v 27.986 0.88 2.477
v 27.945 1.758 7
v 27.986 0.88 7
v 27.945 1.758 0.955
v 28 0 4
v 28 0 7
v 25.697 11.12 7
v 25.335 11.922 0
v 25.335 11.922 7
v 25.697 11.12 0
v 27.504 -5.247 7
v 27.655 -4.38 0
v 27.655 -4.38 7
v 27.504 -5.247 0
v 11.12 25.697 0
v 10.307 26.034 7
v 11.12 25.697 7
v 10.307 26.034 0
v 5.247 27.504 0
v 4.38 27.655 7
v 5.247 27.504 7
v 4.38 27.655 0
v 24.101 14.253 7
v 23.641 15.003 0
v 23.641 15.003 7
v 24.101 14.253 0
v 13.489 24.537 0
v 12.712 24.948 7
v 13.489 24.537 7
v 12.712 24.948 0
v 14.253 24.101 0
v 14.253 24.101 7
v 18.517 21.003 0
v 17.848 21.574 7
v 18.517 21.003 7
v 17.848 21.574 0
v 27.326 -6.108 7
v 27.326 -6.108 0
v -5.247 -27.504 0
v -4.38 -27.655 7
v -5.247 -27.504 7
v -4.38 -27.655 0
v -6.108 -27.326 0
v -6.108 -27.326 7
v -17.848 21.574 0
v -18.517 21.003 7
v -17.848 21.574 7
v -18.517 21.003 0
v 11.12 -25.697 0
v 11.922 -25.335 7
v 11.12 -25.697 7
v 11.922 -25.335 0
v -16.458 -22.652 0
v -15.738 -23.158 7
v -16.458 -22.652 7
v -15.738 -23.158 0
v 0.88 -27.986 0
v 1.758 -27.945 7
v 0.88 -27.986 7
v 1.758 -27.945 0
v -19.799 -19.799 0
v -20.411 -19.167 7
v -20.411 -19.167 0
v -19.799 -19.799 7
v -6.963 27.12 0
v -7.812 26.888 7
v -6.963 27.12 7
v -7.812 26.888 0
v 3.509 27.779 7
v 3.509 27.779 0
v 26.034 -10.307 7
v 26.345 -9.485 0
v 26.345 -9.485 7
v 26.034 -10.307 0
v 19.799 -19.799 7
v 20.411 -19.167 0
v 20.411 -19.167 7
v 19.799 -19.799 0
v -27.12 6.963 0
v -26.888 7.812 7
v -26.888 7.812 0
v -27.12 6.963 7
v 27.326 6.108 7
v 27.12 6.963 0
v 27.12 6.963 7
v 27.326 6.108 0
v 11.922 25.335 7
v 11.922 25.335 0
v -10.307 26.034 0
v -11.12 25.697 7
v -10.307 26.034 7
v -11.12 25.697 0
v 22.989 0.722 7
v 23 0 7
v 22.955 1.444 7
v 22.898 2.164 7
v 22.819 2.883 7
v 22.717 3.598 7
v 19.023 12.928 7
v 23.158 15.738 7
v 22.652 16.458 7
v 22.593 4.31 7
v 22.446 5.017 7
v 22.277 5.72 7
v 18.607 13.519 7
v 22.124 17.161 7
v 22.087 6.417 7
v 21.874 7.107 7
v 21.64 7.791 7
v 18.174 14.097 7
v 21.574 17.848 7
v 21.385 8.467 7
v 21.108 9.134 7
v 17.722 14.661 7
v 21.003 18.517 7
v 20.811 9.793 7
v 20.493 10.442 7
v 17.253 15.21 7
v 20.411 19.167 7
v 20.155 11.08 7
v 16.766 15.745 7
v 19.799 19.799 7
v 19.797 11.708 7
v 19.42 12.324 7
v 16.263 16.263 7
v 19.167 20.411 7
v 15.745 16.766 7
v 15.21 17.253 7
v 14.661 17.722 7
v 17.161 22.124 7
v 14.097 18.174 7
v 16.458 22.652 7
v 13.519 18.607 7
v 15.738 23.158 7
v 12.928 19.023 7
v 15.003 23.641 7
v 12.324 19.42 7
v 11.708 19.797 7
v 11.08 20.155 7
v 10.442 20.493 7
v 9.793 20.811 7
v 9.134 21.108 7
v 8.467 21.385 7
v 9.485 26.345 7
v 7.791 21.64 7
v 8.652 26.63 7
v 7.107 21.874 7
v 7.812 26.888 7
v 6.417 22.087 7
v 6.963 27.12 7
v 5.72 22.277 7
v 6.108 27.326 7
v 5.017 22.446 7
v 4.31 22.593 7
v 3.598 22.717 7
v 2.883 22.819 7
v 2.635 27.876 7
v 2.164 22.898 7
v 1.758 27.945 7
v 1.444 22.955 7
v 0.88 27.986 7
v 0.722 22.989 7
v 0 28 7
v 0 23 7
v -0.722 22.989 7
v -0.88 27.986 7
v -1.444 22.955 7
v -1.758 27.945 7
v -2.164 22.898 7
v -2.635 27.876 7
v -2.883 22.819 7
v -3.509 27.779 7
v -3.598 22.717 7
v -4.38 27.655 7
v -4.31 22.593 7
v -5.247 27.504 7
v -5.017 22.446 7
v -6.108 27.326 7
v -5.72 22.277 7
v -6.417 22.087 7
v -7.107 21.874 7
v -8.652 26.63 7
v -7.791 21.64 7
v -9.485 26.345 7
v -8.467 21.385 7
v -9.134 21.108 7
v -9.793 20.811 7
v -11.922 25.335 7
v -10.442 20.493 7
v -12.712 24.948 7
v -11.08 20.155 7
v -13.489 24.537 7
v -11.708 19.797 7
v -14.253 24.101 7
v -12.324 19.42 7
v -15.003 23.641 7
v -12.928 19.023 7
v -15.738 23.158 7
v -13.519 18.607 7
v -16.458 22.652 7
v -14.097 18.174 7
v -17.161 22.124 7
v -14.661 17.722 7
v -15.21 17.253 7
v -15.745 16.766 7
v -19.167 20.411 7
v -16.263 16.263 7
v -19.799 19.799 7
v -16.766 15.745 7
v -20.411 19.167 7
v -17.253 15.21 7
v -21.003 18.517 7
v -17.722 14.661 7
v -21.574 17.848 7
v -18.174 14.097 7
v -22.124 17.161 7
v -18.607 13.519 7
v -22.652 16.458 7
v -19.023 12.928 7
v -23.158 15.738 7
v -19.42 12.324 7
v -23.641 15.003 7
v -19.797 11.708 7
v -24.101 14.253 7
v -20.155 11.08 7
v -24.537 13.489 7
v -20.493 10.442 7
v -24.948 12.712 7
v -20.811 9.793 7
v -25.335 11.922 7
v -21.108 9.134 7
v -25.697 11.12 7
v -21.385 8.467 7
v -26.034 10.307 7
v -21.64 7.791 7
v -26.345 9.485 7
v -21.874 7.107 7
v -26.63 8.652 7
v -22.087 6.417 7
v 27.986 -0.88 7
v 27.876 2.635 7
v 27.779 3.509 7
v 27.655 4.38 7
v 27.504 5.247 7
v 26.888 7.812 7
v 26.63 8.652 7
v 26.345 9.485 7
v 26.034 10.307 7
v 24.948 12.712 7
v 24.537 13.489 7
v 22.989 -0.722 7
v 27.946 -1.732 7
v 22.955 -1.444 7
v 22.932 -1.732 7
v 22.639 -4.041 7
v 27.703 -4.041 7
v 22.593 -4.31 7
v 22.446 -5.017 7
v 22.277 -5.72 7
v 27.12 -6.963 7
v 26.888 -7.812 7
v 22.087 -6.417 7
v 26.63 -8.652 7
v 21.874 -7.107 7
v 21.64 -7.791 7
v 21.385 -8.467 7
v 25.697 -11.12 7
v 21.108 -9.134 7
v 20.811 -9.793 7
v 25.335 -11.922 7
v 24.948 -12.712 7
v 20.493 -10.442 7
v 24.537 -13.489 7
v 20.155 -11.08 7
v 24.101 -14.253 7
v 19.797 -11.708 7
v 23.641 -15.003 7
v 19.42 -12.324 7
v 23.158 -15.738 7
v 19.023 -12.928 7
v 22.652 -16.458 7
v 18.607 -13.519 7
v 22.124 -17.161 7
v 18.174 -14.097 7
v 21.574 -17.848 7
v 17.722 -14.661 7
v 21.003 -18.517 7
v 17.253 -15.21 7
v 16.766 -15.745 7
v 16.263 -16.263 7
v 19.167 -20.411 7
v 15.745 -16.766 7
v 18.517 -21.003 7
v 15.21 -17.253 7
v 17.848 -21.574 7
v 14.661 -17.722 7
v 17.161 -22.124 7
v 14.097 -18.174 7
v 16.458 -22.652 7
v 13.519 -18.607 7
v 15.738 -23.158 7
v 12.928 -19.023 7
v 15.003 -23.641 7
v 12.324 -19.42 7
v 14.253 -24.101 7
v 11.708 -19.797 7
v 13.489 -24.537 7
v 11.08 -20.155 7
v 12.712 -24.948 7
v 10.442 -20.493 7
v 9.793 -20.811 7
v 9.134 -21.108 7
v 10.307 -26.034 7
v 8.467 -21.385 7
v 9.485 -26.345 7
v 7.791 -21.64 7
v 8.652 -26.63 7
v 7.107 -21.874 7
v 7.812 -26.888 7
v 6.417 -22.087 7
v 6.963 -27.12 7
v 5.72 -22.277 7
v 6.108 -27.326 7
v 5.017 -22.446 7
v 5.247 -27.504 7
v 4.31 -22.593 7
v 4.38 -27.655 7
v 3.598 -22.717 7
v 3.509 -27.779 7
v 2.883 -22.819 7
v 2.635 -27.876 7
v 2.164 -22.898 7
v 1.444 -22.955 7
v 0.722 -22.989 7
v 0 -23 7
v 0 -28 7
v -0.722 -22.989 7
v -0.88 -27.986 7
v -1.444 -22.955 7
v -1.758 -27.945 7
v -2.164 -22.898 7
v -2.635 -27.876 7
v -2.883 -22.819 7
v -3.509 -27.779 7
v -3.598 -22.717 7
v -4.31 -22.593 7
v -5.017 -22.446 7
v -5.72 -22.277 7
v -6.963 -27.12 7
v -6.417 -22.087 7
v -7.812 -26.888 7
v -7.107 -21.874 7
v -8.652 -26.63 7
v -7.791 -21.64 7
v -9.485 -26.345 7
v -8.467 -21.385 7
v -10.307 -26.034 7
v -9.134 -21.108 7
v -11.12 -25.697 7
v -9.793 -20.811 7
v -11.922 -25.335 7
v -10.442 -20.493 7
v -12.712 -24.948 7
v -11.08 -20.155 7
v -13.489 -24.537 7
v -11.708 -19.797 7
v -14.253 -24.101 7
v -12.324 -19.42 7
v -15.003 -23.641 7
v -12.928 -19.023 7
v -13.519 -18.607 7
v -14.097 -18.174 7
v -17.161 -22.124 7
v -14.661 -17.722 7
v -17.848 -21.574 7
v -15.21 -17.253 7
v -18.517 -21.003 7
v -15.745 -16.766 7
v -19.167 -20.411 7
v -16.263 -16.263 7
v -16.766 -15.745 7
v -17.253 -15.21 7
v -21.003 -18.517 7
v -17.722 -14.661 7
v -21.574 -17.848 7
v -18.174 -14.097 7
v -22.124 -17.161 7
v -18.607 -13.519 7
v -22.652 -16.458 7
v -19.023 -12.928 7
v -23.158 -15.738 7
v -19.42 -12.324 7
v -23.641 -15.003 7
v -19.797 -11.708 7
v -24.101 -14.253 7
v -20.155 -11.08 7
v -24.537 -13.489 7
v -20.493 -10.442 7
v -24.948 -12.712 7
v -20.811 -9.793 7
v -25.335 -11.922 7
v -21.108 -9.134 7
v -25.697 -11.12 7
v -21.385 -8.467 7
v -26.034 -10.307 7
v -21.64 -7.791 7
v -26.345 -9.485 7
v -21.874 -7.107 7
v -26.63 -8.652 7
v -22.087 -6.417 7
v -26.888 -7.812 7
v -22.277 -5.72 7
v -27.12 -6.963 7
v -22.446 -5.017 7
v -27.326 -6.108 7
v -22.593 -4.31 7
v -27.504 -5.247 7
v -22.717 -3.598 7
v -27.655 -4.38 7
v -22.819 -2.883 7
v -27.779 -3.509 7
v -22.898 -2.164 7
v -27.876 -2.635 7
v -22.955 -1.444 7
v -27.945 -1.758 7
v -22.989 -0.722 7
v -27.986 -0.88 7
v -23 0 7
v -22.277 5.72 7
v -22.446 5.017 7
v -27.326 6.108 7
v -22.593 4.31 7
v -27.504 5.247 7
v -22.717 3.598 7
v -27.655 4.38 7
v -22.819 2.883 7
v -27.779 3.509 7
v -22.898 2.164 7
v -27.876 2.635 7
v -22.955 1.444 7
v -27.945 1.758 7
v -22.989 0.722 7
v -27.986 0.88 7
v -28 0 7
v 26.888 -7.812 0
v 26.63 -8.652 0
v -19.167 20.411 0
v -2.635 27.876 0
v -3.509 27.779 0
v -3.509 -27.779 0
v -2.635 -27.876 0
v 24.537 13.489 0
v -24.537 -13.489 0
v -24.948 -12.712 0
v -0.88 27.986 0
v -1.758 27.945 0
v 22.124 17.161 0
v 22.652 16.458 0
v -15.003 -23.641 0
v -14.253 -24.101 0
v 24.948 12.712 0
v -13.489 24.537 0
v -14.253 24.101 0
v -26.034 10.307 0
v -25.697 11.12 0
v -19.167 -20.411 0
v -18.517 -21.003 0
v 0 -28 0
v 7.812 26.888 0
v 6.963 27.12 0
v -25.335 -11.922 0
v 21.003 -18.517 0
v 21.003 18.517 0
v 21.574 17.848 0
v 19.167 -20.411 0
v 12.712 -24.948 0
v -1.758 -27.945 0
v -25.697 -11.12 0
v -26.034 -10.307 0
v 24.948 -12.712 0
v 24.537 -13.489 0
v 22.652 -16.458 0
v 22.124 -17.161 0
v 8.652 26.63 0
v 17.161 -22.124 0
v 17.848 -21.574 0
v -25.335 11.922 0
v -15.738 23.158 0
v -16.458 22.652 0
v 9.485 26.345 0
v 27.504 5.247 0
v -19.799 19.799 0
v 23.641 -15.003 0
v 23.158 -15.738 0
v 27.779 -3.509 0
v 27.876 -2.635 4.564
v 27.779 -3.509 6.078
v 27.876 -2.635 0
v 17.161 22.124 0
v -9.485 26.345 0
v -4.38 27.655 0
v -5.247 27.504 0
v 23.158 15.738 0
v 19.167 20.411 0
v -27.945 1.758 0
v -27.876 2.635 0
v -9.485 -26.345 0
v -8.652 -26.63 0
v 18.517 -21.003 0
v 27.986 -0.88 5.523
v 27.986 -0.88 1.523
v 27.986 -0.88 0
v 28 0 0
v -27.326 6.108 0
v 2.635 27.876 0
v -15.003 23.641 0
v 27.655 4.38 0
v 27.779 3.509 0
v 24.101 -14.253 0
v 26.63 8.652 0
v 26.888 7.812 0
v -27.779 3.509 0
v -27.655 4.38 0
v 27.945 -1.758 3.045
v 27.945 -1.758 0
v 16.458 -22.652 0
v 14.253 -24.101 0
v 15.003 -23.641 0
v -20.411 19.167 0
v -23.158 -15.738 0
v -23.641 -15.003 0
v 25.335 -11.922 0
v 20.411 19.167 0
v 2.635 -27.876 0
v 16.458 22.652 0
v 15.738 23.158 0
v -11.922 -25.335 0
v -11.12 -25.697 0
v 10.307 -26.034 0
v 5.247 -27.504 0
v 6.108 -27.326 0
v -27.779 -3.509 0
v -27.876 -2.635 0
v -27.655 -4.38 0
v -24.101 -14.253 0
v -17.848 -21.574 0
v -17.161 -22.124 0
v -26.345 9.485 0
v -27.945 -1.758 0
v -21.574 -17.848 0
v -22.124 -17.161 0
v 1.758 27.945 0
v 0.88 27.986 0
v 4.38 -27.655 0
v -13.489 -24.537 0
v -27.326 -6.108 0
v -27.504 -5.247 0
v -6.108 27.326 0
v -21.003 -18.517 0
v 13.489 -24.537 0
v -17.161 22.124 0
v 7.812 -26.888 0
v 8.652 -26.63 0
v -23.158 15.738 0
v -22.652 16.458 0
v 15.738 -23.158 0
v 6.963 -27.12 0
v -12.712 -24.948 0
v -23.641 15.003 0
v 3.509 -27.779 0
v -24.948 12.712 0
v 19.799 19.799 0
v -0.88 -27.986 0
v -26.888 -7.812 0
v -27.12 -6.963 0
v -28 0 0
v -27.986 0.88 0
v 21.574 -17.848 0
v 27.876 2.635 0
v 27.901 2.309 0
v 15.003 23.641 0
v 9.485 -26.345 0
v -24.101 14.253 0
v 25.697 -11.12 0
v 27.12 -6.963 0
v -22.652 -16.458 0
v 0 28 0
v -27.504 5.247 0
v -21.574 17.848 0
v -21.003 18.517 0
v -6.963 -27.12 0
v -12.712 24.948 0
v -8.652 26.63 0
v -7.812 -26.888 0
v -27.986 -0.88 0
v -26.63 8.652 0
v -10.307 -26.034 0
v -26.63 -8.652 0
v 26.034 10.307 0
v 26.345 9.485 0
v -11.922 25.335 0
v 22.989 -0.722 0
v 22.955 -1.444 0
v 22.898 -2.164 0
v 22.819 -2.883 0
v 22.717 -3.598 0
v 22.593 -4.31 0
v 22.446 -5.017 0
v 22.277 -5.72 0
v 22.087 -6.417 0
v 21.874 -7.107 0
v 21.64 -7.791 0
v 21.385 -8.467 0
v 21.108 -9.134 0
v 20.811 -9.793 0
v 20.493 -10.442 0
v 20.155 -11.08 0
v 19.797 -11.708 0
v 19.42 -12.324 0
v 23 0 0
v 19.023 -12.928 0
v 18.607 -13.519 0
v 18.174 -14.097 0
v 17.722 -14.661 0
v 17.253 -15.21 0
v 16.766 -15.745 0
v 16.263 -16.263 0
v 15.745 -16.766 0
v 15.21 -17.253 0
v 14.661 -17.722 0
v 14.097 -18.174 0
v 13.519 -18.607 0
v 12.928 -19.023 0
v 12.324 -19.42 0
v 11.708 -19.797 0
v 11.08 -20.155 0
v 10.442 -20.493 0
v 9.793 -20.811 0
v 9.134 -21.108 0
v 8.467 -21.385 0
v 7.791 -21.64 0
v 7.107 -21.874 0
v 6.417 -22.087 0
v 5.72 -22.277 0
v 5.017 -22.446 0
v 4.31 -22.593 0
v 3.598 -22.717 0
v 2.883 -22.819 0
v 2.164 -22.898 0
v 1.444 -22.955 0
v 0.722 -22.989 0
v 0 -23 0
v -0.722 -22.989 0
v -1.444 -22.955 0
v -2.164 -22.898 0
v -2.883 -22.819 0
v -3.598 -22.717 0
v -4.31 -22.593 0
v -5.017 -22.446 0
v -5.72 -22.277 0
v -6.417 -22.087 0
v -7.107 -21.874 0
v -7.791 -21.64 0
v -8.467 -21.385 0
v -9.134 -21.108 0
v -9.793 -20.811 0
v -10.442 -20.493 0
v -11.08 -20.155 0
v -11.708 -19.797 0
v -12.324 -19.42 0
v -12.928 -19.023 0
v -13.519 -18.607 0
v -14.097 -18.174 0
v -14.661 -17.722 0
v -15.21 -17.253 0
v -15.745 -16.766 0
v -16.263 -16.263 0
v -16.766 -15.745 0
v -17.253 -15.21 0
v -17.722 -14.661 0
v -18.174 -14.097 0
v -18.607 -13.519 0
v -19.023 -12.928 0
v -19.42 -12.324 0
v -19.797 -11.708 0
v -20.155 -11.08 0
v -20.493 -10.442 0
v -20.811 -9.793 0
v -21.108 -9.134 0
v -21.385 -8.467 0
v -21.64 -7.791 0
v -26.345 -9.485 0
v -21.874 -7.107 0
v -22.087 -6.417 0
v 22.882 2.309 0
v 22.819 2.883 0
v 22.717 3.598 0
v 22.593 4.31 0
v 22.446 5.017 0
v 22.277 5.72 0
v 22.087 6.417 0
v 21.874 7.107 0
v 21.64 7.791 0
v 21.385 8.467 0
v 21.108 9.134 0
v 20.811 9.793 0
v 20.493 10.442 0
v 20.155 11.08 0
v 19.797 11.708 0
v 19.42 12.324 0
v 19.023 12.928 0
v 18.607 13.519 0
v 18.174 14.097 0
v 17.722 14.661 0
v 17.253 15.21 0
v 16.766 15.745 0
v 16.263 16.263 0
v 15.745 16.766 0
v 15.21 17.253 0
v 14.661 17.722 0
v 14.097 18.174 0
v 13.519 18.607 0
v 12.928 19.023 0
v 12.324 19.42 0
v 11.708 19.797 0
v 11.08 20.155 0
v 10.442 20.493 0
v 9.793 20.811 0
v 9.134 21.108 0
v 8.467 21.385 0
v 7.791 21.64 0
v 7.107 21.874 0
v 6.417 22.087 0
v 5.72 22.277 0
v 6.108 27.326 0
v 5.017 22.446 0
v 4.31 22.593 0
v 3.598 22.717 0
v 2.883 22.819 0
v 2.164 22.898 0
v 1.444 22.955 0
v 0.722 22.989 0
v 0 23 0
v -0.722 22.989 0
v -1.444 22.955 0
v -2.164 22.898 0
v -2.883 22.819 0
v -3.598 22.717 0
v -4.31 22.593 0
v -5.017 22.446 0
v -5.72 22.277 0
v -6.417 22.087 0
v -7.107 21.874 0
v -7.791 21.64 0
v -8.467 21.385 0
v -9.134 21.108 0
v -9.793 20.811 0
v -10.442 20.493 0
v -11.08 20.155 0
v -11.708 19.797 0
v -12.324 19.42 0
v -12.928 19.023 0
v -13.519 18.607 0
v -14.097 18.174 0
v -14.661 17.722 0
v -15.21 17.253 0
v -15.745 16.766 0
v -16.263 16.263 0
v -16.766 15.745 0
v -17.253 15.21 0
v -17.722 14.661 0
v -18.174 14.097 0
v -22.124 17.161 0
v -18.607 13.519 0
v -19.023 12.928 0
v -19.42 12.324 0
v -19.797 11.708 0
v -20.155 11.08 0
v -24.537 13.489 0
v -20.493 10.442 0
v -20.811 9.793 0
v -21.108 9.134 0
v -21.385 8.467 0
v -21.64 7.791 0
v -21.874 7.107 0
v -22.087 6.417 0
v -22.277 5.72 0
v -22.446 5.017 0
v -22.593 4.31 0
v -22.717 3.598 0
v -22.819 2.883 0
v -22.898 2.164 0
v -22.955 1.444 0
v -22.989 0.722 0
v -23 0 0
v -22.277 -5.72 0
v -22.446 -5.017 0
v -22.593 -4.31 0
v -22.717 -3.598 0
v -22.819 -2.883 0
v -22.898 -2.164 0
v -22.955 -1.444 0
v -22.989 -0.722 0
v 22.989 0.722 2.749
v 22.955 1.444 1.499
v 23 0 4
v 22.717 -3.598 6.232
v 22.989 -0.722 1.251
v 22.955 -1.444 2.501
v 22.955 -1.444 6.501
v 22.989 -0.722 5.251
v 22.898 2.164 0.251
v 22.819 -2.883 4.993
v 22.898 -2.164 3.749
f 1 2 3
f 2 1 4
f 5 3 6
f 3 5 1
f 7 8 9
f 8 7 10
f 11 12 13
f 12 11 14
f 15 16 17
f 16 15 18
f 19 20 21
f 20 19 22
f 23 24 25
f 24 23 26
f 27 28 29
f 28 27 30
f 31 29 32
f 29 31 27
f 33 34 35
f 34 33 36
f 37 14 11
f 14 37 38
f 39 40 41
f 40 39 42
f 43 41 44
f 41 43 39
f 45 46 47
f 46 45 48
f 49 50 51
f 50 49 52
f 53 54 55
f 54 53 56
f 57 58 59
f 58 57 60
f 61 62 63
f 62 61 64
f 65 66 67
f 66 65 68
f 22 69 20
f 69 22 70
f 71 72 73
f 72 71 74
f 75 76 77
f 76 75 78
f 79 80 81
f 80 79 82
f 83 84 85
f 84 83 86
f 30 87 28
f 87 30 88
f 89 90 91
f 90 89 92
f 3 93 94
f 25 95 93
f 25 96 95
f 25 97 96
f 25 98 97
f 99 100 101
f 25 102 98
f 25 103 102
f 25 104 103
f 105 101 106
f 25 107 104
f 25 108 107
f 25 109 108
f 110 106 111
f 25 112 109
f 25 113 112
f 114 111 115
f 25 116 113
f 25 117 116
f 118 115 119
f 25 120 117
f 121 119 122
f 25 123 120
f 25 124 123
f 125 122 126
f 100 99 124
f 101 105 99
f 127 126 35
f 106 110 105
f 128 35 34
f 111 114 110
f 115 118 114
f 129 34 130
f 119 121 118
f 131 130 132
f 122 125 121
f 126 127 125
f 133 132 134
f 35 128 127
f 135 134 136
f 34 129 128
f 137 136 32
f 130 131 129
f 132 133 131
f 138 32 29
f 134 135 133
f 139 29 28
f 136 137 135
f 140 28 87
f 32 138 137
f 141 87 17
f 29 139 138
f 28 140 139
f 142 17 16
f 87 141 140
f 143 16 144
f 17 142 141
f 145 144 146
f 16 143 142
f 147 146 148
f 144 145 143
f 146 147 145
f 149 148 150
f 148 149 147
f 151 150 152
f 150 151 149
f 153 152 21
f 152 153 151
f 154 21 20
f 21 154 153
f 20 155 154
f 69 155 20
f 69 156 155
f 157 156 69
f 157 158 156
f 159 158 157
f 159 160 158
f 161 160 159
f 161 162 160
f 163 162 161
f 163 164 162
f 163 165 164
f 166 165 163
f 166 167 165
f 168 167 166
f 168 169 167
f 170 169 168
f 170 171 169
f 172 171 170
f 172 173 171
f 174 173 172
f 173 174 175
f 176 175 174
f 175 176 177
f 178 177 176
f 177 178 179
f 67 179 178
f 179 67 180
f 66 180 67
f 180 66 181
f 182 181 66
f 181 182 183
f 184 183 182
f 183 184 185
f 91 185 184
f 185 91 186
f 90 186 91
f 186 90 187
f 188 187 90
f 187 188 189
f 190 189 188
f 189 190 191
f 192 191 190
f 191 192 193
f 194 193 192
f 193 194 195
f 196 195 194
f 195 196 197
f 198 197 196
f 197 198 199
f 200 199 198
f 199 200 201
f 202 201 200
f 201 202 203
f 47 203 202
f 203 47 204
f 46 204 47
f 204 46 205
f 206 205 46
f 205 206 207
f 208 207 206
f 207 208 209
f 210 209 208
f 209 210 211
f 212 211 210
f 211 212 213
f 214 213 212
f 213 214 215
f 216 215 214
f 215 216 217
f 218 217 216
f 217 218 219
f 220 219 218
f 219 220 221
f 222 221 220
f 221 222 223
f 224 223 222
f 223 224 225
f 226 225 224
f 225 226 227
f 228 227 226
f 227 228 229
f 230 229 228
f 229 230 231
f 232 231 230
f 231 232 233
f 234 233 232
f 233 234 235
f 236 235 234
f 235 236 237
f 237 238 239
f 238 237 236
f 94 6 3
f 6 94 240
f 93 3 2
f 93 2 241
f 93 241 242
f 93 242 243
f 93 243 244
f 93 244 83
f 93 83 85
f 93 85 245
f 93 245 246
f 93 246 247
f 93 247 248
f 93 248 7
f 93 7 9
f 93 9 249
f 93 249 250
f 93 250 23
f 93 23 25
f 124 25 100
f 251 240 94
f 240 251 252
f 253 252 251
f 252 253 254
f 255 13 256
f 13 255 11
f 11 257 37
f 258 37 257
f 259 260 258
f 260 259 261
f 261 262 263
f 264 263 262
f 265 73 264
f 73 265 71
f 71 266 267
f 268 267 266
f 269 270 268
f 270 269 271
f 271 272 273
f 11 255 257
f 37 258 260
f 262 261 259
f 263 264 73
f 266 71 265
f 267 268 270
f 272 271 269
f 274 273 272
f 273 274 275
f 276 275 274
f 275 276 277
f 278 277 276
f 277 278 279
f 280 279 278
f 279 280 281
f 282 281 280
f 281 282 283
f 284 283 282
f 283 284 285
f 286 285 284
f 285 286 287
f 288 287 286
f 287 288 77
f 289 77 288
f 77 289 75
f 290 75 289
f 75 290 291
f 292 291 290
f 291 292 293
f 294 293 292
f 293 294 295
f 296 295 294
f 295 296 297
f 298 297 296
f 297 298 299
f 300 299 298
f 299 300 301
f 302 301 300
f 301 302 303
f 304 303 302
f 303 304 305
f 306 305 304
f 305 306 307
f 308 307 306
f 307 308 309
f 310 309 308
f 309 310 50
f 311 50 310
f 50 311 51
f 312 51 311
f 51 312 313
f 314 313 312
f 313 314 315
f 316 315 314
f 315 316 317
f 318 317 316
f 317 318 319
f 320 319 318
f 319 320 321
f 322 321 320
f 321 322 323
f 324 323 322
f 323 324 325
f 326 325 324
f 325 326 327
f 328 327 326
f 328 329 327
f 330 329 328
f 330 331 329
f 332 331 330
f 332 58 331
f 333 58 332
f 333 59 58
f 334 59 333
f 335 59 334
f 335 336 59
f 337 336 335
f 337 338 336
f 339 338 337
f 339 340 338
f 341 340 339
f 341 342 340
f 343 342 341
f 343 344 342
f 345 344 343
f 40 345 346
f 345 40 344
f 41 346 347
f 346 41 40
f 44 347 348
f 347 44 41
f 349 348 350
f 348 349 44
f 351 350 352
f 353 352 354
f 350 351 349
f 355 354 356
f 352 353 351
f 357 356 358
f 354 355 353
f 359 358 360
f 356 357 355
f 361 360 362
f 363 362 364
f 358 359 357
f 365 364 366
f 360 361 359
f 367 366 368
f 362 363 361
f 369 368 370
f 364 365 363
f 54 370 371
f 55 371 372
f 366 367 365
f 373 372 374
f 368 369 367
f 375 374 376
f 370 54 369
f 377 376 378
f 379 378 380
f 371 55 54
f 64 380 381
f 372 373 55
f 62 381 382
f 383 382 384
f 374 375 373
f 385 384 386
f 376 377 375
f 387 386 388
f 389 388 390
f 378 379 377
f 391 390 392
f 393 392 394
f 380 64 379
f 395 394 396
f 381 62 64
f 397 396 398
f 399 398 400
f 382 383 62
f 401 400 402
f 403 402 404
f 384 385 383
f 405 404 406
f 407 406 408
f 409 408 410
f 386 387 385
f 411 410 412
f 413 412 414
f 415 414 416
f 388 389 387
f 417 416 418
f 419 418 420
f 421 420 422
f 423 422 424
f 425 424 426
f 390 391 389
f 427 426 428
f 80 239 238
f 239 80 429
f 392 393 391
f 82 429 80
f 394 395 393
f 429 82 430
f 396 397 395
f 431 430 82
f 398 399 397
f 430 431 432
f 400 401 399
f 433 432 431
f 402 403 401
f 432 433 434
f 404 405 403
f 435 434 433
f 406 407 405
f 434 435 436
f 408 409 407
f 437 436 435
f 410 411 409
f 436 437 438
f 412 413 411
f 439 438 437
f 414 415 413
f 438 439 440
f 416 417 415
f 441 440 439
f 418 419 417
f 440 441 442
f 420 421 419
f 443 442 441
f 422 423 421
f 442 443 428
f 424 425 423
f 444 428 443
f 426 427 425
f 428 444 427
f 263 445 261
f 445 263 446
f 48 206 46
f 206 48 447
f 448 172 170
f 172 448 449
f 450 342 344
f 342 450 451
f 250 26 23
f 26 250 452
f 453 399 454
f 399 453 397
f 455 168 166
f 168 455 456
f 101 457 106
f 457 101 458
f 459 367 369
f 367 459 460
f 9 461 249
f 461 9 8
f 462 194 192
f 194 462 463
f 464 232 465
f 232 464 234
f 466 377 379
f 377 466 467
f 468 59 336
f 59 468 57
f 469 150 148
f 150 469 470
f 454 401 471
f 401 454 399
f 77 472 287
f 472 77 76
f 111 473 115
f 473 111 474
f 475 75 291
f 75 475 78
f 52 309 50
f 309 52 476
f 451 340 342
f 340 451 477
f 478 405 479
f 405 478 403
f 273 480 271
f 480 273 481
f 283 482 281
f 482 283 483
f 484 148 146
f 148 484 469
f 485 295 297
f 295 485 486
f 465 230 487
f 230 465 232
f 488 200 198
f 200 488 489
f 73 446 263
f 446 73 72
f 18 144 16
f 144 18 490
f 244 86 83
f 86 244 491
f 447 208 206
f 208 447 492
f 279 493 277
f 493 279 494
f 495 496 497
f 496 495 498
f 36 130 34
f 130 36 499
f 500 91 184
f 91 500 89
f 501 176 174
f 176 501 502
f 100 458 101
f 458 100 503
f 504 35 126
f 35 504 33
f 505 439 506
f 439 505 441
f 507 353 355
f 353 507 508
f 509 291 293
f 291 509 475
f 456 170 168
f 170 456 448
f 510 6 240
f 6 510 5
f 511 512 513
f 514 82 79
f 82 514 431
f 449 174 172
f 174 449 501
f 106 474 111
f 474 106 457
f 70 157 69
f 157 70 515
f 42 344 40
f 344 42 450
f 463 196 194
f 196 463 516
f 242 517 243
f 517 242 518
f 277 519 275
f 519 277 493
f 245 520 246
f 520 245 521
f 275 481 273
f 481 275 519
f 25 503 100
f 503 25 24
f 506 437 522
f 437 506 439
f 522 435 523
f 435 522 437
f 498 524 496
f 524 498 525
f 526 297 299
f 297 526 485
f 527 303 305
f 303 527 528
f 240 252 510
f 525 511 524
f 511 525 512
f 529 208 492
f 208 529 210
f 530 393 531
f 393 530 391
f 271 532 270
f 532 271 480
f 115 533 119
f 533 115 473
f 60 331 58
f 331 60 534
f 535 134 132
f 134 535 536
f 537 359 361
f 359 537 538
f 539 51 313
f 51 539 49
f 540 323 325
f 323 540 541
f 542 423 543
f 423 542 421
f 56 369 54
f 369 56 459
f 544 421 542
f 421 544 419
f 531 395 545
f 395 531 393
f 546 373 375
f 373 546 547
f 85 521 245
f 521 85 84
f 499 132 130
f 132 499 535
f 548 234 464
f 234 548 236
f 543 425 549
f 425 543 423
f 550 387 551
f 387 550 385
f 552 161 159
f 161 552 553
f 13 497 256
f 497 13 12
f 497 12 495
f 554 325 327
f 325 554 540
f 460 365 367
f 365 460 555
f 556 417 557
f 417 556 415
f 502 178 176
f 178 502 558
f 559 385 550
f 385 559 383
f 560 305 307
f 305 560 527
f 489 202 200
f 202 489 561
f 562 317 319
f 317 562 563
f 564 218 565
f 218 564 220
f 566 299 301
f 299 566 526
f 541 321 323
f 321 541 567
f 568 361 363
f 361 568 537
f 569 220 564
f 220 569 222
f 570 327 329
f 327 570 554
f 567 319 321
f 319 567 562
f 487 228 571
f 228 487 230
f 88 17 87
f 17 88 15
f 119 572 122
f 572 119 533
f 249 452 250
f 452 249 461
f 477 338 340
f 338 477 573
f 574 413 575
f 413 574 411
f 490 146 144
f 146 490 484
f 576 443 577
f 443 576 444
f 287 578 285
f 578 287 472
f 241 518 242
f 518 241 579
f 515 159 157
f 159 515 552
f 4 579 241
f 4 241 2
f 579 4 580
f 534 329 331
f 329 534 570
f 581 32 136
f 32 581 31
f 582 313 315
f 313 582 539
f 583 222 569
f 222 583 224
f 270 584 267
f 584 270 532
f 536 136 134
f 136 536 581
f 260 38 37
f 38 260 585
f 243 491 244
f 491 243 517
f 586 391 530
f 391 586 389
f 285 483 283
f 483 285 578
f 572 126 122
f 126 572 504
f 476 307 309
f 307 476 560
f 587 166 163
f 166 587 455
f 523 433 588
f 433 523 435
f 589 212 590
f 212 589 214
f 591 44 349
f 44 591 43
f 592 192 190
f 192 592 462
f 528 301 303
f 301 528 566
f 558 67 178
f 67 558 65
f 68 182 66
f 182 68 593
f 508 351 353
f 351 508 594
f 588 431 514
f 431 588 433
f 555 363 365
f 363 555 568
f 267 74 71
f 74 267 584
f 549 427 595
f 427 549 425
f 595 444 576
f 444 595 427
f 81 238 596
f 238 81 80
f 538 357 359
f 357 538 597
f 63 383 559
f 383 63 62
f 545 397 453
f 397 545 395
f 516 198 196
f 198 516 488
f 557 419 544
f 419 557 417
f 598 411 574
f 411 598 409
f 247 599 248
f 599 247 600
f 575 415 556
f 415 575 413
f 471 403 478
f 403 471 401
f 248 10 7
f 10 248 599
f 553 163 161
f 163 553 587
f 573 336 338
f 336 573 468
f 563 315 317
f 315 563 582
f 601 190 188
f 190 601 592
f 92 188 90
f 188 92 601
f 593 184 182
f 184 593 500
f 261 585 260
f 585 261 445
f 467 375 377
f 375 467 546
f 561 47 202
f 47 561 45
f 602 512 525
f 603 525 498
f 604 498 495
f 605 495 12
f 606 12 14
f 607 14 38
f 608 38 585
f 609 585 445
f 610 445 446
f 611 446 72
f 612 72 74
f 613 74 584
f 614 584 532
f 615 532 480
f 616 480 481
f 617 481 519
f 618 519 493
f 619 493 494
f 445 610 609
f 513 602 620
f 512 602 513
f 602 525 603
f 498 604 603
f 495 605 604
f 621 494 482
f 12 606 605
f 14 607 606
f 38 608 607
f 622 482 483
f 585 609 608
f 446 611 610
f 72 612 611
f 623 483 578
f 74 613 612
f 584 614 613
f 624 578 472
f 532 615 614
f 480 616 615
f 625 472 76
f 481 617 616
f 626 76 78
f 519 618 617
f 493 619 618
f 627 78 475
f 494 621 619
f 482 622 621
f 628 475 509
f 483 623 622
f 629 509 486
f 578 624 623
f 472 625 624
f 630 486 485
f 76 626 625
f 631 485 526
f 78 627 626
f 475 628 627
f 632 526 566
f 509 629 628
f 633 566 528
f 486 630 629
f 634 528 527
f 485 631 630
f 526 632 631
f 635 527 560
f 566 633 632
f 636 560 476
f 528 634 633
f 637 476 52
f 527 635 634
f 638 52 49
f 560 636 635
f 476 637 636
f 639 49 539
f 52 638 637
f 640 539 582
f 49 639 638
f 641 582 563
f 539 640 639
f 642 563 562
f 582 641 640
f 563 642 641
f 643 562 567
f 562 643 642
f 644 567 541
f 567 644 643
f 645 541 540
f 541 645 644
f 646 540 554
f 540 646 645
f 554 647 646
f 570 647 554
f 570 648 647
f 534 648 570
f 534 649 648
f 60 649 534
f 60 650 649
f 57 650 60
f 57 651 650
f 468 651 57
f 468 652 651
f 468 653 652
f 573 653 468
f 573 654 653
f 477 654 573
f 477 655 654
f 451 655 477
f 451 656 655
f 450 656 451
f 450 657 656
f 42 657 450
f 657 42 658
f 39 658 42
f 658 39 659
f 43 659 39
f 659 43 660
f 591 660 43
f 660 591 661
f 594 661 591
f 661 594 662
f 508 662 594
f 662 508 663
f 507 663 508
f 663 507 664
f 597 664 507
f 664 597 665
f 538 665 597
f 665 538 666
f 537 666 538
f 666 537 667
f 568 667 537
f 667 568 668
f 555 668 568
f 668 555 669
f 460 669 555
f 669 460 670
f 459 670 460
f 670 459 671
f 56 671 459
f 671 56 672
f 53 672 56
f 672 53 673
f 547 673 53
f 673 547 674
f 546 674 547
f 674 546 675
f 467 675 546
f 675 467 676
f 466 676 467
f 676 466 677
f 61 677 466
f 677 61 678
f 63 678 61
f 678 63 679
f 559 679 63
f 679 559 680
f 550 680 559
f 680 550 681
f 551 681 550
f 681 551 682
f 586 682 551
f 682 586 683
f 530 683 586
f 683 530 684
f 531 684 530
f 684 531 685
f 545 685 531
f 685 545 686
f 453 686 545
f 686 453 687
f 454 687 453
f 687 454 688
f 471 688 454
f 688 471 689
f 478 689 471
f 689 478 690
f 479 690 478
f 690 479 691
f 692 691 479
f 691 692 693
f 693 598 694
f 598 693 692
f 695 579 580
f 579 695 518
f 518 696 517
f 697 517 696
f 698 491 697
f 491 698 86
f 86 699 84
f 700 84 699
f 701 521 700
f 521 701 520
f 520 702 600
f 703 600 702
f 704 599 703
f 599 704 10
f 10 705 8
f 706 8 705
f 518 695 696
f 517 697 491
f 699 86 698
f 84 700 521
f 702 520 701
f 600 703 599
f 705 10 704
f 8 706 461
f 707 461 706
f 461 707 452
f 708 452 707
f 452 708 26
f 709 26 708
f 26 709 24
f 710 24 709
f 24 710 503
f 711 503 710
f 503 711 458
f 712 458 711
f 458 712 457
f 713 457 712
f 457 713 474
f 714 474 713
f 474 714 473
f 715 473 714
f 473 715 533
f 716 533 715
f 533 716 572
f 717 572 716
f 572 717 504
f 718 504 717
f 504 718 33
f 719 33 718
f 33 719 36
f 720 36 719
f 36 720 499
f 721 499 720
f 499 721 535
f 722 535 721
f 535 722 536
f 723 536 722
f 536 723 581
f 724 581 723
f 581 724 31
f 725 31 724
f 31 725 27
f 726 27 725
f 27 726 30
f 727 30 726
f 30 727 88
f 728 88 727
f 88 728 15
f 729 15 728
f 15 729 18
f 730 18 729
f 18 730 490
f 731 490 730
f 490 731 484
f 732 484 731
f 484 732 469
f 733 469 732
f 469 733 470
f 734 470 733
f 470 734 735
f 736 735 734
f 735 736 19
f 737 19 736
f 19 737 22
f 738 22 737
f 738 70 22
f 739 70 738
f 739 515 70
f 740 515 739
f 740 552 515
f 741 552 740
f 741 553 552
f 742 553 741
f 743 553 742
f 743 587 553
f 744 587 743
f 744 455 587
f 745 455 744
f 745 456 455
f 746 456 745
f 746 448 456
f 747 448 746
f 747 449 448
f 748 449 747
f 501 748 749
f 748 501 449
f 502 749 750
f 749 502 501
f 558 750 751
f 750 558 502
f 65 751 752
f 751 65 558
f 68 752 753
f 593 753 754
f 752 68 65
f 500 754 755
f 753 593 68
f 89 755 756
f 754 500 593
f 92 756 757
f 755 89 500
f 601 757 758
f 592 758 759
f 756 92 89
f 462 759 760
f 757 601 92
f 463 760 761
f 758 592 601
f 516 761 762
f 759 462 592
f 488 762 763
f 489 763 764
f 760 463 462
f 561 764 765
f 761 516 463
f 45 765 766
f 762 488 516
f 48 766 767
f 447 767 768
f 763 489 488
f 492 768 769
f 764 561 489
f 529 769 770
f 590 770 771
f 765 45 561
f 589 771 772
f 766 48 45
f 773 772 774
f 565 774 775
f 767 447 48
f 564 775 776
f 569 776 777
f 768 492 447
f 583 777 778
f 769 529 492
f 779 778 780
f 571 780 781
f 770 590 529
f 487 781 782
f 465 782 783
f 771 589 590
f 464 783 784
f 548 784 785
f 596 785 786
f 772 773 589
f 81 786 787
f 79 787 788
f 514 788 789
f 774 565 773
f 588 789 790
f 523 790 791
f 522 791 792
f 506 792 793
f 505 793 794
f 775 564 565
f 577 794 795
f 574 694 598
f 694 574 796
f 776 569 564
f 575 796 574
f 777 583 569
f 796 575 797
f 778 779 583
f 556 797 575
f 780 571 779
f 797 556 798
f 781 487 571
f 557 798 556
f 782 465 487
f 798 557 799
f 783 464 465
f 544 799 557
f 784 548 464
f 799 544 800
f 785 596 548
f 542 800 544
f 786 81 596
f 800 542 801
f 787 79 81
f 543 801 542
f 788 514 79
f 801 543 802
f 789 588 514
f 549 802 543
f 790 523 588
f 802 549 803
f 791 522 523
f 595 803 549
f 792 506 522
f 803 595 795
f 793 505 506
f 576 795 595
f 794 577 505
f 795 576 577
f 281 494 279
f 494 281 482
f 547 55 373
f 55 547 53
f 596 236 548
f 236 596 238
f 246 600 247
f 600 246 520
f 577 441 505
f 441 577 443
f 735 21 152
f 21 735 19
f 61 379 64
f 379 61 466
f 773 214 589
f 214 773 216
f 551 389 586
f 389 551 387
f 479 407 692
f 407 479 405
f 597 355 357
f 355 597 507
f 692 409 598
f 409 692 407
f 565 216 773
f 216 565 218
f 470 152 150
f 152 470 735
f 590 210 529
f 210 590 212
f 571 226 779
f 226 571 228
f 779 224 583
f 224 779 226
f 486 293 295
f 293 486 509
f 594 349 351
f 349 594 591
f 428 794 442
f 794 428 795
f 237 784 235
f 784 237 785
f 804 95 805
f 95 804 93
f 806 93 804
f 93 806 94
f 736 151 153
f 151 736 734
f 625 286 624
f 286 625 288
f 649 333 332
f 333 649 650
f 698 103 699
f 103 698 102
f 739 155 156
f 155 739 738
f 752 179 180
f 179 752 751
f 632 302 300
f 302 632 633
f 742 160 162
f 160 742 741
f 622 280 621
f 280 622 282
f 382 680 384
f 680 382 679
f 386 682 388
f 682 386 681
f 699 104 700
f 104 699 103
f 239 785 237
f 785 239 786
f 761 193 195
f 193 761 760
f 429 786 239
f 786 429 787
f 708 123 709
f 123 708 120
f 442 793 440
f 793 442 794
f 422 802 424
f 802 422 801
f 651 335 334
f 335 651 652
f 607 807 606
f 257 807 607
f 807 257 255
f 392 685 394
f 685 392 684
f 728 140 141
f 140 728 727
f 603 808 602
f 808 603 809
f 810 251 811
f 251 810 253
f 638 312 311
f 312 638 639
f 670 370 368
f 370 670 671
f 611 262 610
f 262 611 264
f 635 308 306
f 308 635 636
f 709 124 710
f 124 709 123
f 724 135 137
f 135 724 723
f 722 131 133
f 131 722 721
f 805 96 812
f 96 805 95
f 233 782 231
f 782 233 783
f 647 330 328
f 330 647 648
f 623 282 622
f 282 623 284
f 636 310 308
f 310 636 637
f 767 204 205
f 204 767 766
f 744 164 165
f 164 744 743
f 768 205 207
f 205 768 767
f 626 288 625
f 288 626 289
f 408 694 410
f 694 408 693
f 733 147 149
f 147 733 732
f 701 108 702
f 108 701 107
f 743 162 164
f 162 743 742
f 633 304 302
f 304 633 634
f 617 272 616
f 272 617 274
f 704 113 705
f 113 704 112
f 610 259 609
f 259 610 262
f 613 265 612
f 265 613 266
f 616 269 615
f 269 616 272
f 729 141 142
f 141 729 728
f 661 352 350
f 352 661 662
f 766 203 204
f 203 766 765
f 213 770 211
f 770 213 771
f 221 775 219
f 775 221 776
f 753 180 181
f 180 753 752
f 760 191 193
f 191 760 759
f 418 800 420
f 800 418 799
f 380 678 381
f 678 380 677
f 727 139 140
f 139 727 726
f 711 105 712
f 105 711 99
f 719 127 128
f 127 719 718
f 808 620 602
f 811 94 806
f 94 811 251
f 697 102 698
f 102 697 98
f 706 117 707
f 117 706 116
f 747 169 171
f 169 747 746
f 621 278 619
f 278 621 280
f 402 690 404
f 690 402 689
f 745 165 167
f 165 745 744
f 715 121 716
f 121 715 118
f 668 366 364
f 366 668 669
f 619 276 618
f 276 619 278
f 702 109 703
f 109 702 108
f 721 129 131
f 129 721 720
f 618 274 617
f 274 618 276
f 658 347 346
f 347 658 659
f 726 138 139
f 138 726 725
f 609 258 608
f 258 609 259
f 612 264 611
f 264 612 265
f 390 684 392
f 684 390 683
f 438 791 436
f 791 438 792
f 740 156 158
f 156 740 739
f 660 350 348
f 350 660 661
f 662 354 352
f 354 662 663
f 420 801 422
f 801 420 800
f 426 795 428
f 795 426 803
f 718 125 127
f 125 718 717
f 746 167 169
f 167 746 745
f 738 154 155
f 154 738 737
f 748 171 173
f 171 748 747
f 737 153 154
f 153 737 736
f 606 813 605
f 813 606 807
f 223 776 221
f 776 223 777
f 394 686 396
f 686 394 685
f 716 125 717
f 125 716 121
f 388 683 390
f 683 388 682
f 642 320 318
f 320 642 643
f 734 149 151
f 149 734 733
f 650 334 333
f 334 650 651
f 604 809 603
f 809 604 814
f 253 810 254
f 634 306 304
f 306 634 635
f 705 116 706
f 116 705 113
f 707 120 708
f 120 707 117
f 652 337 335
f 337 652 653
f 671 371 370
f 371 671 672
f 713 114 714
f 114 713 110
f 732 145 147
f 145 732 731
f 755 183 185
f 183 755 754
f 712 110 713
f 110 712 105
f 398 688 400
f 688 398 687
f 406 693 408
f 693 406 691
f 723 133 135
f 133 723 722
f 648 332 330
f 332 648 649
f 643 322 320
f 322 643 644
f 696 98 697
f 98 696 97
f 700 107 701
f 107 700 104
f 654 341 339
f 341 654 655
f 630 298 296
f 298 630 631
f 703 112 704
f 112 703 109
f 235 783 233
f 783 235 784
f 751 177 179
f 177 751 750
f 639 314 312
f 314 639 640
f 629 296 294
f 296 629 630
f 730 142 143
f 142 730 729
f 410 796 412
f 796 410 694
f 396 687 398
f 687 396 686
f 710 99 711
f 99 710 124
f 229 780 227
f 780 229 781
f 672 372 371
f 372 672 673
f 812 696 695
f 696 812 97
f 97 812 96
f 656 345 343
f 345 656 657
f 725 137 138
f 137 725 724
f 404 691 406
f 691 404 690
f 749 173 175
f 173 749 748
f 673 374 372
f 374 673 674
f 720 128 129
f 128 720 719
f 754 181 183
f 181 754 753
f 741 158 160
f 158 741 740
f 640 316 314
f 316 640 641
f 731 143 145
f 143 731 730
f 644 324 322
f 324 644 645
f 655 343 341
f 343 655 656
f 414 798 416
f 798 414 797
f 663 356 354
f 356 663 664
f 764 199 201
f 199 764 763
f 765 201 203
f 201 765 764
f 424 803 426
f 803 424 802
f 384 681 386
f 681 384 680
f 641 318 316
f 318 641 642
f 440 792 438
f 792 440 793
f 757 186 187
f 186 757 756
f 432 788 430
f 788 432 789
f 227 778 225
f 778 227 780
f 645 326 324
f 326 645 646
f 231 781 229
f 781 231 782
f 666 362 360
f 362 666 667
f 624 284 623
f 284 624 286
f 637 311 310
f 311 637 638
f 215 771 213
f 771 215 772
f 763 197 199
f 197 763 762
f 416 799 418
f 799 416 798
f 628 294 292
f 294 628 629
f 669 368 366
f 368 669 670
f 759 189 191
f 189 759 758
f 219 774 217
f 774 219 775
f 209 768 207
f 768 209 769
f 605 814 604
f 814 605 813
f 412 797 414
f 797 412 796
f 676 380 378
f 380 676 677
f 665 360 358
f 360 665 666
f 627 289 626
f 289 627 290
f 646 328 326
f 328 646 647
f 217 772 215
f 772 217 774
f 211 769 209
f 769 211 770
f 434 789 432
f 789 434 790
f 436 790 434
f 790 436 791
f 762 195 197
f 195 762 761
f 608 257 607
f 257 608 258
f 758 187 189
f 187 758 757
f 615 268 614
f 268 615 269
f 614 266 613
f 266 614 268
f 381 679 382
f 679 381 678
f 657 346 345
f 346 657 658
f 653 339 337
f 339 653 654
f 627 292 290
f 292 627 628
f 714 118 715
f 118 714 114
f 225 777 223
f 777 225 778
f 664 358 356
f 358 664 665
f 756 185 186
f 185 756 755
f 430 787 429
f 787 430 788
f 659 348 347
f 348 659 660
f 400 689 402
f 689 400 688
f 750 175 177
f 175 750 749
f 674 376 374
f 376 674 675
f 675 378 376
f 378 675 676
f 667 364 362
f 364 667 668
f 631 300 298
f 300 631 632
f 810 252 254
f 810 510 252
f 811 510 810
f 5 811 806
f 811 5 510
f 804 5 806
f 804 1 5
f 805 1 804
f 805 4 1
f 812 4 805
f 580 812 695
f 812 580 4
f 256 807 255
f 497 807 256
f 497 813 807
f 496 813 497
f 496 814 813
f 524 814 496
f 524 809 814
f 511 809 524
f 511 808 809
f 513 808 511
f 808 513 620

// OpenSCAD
// [FL_INDEX: keywords="openscad, 3d_parametric, Rolling_Pin_Spacer, csg_solid" | COT="Parametric OpenSCAD design from 3DCodeverse"]
// Title: Rolling Pin Spacer

// Rolling Pin Spacers
// all measurements are in mm

// Diameter of rolling pin in mm (best if slightly smaller than actual)
pin = 46;
pinr=pin/2;

// How thick you want the dough to be in mm
Dough = 5;

difference () {
   cylinder (h=7,r=pinr+Dough, $fn = 200);
   translate ([0,0,-2]) cylinder (h=14,r=pinr, $fn = 200);
   rotate([30,0,0]) translate ([0,0,-5]) cube([pinr+Dough+2,2,20]);;
}
